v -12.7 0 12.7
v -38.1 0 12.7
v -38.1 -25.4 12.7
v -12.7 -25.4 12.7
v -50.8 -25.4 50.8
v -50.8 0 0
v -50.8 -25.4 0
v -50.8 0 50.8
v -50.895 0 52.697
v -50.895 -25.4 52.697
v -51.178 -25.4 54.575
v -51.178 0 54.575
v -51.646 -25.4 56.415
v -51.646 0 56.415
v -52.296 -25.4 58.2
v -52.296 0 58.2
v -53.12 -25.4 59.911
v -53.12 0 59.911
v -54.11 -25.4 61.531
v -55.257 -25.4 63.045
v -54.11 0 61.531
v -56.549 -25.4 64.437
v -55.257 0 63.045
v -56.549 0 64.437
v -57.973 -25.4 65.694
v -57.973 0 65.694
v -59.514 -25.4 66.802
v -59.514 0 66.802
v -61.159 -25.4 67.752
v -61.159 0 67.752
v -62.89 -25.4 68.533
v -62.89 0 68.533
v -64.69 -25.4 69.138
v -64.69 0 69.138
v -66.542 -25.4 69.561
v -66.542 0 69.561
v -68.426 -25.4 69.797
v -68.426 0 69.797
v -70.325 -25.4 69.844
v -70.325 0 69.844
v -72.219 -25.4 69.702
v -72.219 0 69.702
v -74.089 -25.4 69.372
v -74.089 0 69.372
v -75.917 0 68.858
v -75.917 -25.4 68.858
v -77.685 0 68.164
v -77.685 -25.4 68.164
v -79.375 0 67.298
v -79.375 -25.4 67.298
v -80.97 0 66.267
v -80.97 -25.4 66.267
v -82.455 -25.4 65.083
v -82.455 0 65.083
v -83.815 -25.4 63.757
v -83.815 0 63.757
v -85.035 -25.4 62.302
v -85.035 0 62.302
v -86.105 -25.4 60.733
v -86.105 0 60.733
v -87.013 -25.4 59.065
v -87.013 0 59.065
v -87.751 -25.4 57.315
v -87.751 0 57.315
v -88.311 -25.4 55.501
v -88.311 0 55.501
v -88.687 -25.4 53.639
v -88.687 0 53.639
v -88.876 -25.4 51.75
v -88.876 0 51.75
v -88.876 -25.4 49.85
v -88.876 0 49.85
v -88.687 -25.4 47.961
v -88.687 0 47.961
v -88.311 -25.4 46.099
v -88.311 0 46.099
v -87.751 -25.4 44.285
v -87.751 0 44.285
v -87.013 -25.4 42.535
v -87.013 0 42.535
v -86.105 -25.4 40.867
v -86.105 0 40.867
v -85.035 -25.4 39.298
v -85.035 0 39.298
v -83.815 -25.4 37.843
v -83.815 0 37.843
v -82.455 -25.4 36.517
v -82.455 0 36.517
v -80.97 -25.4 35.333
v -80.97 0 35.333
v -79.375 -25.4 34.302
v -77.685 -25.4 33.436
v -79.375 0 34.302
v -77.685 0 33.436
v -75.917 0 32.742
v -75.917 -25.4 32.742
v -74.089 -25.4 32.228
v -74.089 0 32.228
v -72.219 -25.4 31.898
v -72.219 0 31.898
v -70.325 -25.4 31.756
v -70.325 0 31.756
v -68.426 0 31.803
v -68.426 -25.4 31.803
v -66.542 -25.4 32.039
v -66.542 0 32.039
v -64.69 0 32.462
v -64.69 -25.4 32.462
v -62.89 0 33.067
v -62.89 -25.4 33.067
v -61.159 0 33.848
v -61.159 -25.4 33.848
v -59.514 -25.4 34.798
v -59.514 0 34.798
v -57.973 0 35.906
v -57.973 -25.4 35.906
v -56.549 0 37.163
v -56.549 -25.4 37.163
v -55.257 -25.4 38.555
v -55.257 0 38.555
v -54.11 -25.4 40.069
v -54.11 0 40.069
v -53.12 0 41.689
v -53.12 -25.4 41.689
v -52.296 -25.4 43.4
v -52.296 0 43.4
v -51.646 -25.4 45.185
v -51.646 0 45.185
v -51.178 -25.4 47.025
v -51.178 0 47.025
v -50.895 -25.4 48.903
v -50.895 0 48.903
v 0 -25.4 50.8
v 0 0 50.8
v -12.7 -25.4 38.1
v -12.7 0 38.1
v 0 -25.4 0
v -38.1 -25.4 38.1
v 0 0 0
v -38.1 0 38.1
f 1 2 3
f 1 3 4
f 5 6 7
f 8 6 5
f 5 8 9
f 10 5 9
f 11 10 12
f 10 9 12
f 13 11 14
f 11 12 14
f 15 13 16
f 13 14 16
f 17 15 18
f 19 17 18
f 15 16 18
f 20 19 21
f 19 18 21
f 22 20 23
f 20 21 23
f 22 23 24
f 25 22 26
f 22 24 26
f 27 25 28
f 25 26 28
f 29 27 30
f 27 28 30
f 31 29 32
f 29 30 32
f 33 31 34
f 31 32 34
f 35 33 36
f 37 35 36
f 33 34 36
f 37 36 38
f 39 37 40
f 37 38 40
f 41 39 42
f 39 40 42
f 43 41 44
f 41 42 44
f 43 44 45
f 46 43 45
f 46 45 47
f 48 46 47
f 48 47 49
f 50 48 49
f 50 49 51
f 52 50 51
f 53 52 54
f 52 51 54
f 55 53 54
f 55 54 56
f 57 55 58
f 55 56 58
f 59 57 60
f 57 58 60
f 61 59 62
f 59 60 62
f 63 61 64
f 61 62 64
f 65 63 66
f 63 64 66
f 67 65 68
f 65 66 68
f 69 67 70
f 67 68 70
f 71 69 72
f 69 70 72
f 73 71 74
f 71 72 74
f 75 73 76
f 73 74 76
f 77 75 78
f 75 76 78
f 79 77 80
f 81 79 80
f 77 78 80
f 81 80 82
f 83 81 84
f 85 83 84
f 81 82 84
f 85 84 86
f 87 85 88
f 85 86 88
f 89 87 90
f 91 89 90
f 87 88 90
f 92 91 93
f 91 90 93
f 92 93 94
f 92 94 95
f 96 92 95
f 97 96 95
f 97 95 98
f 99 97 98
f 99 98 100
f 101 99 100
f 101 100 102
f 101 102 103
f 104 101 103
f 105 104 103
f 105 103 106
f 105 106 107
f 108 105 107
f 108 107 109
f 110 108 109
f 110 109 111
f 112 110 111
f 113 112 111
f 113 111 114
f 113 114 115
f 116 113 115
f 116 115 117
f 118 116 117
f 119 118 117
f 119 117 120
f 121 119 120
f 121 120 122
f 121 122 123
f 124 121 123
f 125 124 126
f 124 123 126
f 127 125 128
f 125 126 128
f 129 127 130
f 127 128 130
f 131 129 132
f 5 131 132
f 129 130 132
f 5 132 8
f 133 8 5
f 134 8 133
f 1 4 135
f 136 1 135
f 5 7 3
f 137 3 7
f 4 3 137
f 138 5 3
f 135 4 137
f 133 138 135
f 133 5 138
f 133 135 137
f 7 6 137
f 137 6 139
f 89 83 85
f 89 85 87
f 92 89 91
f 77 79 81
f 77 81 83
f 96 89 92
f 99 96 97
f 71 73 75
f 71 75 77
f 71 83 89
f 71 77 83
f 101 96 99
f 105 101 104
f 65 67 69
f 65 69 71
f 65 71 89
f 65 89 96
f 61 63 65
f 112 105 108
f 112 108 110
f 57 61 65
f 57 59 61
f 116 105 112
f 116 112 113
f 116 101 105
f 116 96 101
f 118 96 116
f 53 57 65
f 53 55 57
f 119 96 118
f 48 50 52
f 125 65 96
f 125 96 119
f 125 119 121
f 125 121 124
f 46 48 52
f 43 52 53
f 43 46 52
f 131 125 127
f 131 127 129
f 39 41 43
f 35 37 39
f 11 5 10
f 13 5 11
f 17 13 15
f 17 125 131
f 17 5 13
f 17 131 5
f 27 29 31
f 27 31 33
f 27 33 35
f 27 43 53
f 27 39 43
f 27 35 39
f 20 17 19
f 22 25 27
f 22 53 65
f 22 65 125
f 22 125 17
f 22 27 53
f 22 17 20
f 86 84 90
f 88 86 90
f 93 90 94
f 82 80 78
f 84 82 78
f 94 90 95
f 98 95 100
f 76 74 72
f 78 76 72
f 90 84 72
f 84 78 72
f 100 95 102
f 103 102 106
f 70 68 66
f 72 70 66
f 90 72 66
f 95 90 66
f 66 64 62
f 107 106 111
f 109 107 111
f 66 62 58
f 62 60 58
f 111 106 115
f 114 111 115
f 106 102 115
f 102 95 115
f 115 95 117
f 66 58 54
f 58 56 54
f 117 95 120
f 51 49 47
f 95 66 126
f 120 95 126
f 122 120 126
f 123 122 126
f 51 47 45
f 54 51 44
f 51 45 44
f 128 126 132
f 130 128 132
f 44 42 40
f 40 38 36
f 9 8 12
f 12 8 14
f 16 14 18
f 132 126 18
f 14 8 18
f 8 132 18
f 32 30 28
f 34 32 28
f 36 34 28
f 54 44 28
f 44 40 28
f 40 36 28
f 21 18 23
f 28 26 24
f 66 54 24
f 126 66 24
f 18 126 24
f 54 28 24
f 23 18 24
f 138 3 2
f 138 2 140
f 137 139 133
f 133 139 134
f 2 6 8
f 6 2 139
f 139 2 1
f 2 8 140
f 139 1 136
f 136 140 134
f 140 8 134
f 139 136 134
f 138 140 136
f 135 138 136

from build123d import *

# Parameters (mm, degrees)
F0_W     = 50.8
F0_H     = 50.8
F0_W_2   = 25.4
F0_H_2   = 25.4
F0_R     = 19.05
F1_DEPTH = 25.4


with BuildPart() as f1:
    # F0 (on Front) → F1 (new body)
    with BuildSketch(Plane.XZ):
        with Locations((-25.4, 25.4)):
            Rectangle(F0_W, F0_H)
        with Locations((-25.4, 25.4)):
            Rectangle(F0_W_2, F0_H_2, mode=Mode.SUBTRACT)
        with Locations((-69.85, 50.8)):
            Circle(F0_R)
    extrude(amount=F1_DEPTH)


solid = f1.part
